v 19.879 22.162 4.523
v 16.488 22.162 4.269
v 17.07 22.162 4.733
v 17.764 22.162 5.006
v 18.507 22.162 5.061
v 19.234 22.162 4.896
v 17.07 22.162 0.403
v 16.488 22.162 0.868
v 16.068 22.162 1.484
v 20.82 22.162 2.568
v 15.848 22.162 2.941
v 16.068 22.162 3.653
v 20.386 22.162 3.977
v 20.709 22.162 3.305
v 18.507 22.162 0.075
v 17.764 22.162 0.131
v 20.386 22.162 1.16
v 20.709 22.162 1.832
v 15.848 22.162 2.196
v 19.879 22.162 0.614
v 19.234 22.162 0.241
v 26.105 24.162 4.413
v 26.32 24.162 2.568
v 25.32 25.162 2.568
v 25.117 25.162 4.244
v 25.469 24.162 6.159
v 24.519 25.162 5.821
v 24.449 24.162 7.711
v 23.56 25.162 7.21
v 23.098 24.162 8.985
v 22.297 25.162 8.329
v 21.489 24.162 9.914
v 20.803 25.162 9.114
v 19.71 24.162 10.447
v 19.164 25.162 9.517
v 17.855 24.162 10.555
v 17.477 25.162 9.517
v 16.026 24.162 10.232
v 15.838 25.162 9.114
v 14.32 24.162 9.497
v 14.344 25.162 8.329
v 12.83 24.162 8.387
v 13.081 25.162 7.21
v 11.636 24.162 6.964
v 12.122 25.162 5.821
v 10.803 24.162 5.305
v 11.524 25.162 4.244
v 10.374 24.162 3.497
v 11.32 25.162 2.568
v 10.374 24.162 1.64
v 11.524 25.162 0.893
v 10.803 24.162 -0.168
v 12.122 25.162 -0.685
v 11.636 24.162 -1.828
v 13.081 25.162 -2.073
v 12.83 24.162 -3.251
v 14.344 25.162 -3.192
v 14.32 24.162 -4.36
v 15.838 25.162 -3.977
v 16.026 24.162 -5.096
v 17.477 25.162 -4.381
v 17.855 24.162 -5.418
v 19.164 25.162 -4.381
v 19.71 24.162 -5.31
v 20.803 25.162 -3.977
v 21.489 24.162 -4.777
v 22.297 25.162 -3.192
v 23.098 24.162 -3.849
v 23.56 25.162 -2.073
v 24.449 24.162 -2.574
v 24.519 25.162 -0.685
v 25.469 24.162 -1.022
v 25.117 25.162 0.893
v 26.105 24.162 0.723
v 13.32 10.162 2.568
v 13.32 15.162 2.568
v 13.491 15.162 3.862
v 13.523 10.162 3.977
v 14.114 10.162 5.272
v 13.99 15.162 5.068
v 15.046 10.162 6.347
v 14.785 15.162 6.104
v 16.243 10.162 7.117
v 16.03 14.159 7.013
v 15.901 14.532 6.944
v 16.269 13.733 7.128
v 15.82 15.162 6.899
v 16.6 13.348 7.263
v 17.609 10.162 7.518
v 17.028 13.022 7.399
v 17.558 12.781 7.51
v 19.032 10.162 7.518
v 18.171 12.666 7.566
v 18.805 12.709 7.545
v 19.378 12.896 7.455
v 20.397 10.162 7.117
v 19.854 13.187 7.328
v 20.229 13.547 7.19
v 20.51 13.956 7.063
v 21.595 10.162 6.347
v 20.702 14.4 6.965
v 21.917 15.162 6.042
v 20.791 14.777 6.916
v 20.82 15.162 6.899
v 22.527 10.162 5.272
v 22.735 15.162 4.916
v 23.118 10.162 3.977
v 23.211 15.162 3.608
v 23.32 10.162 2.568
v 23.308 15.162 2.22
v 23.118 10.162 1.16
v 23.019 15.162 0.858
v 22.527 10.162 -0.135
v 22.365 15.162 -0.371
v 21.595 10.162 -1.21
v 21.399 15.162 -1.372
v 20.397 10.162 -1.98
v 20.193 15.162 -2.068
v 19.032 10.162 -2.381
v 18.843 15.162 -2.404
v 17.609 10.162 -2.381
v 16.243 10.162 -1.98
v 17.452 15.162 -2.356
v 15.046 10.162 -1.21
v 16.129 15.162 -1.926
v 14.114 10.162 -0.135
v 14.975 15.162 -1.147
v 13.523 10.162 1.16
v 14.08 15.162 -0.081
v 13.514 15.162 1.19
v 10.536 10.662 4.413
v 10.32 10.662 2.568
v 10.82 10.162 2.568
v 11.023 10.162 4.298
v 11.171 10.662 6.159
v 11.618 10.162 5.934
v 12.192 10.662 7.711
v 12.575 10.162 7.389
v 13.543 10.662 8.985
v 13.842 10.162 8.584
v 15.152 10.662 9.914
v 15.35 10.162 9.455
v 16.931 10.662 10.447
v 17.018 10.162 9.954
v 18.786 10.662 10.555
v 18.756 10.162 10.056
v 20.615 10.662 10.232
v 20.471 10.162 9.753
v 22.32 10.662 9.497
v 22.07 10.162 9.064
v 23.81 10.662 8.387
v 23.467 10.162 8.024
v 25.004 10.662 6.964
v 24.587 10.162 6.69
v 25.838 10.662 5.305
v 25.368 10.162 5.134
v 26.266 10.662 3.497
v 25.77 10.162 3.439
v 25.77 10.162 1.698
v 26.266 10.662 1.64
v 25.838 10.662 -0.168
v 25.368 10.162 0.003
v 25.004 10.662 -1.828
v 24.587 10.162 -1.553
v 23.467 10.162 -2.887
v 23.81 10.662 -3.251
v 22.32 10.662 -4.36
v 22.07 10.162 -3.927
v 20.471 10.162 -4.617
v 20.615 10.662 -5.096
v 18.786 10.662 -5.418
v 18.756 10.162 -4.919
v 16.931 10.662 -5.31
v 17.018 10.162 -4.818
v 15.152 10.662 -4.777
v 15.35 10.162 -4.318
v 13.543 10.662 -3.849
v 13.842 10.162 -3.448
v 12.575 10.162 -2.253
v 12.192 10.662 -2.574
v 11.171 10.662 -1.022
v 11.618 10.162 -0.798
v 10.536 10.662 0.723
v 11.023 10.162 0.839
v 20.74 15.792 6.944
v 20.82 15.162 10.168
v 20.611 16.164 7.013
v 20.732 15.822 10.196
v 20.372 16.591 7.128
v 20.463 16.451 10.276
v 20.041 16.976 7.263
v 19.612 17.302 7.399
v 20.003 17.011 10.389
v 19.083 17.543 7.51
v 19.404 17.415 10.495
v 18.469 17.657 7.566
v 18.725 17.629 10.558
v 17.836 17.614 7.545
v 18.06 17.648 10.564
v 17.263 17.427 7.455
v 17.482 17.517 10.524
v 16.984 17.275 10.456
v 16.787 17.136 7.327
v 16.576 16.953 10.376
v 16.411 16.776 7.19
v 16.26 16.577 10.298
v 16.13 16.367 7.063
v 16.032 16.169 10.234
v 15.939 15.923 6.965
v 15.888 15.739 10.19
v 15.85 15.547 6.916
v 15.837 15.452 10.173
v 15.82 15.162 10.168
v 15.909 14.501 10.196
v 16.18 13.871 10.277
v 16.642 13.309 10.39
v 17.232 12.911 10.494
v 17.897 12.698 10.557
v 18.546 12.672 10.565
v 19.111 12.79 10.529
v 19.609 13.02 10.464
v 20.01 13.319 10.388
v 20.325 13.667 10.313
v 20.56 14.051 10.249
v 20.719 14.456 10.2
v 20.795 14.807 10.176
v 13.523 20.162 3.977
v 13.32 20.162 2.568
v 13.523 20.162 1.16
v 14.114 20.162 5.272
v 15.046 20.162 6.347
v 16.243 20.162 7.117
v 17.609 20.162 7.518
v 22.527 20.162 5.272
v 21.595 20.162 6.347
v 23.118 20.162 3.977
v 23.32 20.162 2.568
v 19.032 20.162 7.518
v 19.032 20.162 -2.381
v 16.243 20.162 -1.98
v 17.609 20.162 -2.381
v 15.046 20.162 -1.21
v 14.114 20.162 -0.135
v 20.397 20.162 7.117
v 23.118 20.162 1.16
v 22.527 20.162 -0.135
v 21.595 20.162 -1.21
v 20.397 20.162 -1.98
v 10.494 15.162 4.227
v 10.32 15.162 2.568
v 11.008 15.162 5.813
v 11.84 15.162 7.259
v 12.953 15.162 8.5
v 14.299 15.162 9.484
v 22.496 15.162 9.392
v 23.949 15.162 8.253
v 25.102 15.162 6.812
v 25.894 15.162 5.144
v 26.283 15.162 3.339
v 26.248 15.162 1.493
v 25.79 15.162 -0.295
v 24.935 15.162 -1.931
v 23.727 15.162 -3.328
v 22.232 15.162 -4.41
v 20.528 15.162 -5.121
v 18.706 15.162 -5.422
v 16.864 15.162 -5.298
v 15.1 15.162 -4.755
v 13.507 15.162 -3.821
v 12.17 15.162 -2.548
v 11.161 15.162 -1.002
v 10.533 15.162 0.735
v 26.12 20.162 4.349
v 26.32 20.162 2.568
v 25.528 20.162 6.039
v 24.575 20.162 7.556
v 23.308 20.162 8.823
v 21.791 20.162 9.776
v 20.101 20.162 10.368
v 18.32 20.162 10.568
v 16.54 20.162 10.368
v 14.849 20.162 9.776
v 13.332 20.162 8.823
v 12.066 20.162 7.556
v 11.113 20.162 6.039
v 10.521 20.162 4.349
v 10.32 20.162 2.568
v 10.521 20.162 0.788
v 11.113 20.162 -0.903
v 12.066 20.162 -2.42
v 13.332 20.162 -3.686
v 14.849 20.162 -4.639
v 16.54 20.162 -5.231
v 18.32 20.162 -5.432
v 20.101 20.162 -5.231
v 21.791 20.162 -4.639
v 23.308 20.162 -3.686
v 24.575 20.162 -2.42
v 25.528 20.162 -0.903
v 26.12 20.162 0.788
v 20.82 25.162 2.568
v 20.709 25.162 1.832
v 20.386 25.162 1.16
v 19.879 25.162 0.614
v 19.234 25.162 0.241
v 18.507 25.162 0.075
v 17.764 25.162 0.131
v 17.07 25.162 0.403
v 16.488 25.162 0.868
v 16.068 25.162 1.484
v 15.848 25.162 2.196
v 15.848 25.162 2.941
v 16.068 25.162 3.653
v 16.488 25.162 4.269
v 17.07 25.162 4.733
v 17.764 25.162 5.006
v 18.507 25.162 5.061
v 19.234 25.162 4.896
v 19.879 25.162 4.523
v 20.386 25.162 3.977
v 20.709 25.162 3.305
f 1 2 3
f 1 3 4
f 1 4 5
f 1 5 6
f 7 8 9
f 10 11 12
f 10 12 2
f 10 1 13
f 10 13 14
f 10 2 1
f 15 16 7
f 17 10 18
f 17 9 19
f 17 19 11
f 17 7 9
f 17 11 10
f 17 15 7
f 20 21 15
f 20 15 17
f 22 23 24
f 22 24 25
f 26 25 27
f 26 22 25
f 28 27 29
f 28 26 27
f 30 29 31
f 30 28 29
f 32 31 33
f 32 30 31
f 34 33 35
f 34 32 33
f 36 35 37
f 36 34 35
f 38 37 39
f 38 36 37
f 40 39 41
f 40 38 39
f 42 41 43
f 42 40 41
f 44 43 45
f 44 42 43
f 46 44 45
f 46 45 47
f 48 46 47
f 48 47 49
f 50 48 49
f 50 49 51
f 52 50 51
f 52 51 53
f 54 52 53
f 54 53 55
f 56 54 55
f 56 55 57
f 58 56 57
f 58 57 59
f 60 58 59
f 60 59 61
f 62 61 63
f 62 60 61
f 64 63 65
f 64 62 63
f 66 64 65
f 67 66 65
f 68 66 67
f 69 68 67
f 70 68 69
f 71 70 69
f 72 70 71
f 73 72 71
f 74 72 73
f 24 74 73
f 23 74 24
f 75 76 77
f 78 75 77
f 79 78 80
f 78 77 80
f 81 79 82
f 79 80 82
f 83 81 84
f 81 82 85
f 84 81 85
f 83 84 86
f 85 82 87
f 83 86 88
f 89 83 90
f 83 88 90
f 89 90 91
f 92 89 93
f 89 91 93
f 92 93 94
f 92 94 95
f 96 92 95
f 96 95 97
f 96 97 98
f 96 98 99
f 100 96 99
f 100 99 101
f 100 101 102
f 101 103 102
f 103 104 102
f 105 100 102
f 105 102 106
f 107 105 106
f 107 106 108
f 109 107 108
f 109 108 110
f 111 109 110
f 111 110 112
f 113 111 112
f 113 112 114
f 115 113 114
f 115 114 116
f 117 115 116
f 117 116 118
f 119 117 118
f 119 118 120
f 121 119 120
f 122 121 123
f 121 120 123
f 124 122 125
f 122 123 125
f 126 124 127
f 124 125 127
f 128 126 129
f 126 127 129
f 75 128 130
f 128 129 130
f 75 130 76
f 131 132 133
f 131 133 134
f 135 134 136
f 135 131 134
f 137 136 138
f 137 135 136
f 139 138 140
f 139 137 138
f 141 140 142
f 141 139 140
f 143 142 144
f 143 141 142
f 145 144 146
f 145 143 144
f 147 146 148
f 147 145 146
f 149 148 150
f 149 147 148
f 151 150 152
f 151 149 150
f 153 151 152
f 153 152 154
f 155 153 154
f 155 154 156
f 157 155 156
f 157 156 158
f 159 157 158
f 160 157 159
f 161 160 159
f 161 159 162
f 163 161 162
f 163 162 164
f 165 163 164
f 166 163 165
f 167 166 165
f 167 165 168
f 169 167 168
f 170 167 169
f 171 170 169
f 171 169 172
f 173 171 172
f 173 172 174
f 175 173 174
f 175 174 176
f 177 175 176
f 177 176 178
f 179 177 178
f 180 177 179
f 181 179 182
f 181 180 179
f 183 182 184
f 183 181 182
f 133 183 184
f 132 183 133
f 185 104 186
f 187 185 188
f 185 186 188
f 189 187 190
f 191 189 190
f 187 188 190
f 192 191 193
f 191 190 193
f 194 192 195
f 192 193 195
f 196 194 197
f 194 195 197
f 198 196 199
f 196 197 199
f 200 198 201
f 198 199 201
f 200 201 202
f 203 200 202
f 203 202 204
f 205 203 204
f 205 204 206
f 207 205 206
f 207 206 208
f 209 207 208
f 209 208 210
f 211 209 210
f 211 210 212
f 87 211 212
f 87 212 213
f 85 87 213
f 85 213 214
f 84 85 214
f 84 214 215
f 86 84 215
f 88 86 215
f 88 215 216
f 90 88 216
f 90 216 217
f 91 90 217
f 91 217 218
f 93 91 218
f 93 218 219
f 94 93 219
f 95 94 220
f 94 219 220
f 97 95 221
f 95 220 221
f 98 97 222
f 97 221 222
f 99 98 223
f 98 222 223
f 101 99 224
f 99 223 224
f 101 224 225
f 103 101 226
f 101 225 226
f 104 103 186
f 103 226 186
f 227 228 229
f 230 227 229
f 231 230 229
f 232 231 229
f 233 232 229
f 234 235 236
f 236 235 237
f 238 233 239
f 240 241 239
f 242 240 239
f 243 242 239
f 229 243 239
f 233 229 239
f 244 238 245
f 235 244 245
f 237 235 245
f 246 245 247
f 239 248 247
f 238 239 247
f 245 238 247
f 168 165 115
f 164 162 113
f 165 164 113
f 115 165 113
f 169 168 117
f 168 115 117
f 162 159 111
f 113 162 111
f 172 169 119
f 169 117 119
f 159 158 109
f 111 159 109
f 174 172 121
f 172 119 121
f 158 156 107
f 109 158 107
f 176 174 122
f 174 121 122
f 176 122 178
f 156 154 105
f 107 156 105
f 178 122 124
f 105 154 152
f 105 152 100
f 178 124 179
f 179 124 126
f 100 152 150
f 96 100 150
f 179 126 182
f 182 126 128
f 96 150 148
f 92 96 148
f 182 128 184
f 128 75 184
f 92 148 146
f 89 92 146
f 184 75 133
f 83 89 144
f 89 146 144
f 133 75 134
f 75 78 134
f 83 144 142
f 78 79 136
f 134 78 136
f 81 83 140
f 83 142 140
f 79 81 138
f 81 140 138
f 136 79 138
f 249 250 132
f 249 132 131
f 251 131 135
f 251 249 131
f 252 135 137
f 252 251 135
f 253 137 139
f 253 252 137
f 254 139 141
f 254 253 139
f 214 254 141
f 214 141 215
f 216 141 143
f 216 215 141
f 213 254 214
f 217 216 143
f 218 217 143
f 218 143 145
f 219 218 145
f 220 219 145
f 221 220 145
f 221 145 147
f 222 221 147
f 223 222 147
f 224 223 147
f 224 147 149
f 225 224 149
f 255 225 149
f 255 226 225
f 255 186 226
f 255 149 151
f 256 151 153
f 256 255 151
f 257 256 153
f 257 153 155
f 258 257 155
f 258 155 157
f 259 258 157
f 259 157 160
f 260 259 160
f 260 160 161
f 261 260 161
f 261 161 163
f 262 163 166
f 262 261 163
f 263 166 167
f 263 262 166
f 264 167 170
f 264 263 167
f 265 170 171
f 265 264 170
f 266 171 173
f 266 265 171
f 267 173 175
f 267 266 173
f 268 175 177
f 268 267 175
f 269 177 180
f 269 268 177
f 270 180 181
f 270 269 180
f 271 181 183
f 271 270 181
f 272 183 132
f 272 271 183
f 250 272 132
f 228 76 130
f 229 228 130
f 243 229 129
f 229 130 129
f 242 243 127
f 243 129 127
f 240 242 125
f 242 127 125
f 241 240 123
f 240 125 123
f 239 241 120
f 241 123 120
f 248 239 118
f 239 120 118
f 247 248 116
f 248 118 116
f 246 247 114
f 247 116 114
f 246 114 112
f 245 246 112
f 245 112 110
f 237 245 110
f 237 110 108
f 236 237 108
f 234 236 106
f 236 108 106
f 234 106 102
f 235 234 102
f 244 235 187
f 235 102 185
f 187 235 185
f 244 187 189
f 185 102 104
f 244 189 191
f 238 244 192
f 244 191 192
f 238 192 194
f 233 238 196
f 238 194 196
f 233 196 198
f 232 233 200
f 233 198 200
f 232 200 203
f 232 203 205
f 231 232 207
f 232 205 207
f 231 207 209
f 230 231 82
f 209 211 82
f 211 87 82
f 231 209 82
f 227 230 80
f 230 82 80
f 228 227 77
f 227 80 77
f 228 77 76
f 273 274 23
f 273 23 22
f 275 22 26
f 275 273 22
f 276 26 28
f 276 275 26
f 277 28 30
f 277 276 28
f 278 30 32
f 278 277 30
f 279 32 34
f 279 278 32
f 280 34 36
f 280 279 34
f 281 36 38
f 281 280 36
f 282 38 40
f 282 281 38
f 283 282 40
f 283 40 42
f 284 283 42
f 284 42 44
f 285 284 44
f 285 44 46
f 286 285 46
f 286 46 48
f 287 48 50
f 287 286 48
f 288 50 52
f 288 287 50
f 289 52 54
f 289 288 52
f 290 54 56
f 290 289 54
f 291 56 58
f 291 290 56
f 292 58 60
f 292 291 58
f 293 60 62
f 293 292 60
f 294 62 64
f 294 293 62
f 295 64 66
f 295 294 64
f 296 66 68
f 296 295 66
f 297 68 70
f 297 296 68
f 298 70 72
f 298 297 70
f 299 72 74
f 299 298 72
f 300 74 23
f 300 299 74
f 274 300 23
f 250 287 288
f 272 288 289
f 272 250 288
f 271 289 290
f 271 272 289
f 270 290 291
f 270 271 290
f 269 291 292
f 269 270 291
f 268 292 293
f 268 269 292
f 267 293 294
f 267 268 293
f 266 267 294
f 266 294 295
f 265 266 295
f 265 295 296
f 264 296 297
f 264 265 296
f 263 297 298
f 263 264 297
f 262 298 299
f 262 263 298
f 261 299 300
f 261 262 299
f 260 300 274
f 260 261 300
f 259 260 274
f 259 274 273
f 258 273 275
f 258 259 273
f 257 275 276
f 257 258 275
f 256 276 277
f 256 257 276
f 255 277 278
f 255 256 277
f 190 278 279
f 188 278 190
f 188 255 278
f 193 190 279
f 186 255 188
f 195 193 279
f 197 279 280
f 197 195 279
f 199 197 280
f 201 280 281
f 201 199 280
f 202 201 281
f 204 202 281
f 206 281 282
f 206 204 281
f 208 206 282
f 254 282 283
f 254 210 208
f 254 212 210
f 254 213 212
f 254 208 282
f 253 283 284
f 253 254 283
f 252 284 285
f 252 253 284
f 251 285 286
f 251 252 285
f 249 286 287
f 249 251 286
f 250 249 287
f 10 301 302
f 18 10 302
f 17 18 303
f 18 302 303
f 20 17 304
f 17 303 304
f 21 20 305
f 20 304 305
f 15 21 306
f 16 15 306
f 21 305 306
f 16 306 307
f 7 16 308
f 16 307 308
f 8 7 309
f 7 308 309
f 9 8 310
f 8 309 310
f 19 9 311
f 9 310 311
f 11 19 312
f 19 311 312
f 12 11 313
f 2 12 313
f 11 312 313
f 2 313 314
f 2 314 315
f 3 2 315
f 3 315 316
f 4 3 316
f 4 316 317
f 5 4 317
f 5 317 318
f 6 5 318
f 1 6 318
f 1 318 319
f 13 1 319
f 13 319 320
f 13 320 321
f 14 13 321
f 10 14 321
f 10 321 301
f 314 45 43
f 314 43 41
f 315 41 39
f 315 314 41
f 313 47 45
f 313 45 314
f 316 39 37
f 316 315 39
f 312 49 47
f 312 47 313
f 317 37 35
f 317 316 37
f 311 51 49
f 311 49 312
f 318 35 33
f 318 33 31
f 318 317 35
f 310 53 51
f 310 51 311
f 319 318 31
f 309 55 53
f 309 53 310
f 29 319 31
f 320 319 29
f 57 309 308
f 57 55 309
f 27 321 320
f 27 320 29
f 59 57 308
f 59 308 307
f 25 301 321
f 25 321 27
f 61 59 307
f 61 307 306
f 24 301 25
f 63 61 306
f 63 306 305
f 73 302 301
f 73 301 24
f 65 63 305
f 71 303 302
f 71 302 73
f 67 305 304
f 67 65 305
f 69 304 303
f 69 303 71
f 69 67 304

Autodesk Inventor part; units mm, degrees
ref_plane "YZ Plane" through (0, 0, 0) normal (1, 0, 0) x (0, 1, 0)
ref_plane "Plano de trabajo1" through (18.3204, 15.1618, 2.5684) normal (0, 1, 0) x (-1, 0, 0)
sketch "Boceto1" plane through (18.3204, 15.1618, 2.5684) normal (0, 1, 0) x (-1, 0, 0)
  circle A0 centre (0, 0) radius 5 projected
  circle A1 centre (0, 0) radius 8
  point P0 (18.3204, -2.5684)
  dimension "d0" = 3
extrude "Extrusión1" add sketch "Boceto1" along normal blind 5 and the other way blind 5
sketch "Boceto2" plane through (18.3204, 20.1618, 2.5684) normal (0, 1, 0) x (1, 0, 0)
  circle A0 centre (0, 0) radius 8 projected
  point P0 (-18.3204, 2.5684)
extrude "Extrusión2" add sketch "Boceto2" along normal blind 5
sketch "Boceto3" plane through (18.3204, 25.1618, 2.5684) normal (0, 1, 0) x (1, 0, 0)
  circle A0 centre (0, 0) radius 2.5
  point P0 (-18.3204, 2.5684)
  dimension "d7" = 5
extrude "Extrusión3" cut sketch "Boceto3" against normal blind 3
ref_plane "Plano de trabajo2" through (0, 0, 11) normal (0, 0, 1) x (1, 0, 0)
sketch "Boceto4" plane through (0, 0, 11) normal (0, 0, 1) x (1, 0, 0)
  line L0 (26.3204, 25.1618) -> (10.3204, 25.1618) projected
  line L1 (10.3204, 10.1618) -> (26.3204, 10.1618) projected
  circle A0 centre (18.3204, 15.1618) radius 2.5
  point P0 (0, 0)
  dimension "d11" = 5
  dimension "d12" = 5
extrude "Extrusión4" cut sketch "Boceto4" against normal blind 6
chamfer "Chaflán1" distance 0.5 angle 45 1 edges at (26.3204, 10.1618, 2.5684)
chamfer "Chaflán2" distance 1 angle 45 1 edges at (10.3204, 25.1618, 2.5684)
properties part number "acople_iman"
